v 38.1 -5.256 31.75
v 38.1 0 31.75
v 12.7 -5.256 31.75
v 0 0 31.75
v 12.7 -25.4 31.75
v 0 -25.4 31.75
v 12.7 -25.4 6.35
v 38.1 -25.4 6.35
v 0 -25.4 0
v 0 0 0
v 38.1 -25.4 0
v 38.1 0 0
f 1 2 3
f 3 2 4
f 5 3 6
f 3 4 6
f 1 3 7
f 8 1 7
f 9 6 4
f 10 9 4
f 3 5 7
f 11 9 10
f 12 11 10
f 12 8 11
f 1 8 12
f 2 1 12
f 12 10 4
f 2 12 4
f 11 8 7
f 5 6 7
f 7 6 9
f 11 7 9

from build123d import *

# Parameters (mm, degrees)
F0_W     = 25.4
F0_H     = 31.75
F1_DEPTH = 12.7
F3_DEPTH = 25.4


with BuildPart() as f1:
    # F0 (on Right) → F1 (new body)
    with BuildSketch(Plane.YZ):
        with Locations((-12.7, 15.875)):
            Rectangle(F0_W, F0_H)
    extrude(amount=F1_DEPTH)

    # F2 (on face) → F3 (join)
    with BuildSketch(Plane.YZ.offset(12.7)):
        Polygon((0, 0), (0, 31.75), (-5.256133, 31.75), (-25.4, 6.35), (-25.4, 0), align=None)
    extrude(amount=F3_DEPTH)


solid = f1.part
